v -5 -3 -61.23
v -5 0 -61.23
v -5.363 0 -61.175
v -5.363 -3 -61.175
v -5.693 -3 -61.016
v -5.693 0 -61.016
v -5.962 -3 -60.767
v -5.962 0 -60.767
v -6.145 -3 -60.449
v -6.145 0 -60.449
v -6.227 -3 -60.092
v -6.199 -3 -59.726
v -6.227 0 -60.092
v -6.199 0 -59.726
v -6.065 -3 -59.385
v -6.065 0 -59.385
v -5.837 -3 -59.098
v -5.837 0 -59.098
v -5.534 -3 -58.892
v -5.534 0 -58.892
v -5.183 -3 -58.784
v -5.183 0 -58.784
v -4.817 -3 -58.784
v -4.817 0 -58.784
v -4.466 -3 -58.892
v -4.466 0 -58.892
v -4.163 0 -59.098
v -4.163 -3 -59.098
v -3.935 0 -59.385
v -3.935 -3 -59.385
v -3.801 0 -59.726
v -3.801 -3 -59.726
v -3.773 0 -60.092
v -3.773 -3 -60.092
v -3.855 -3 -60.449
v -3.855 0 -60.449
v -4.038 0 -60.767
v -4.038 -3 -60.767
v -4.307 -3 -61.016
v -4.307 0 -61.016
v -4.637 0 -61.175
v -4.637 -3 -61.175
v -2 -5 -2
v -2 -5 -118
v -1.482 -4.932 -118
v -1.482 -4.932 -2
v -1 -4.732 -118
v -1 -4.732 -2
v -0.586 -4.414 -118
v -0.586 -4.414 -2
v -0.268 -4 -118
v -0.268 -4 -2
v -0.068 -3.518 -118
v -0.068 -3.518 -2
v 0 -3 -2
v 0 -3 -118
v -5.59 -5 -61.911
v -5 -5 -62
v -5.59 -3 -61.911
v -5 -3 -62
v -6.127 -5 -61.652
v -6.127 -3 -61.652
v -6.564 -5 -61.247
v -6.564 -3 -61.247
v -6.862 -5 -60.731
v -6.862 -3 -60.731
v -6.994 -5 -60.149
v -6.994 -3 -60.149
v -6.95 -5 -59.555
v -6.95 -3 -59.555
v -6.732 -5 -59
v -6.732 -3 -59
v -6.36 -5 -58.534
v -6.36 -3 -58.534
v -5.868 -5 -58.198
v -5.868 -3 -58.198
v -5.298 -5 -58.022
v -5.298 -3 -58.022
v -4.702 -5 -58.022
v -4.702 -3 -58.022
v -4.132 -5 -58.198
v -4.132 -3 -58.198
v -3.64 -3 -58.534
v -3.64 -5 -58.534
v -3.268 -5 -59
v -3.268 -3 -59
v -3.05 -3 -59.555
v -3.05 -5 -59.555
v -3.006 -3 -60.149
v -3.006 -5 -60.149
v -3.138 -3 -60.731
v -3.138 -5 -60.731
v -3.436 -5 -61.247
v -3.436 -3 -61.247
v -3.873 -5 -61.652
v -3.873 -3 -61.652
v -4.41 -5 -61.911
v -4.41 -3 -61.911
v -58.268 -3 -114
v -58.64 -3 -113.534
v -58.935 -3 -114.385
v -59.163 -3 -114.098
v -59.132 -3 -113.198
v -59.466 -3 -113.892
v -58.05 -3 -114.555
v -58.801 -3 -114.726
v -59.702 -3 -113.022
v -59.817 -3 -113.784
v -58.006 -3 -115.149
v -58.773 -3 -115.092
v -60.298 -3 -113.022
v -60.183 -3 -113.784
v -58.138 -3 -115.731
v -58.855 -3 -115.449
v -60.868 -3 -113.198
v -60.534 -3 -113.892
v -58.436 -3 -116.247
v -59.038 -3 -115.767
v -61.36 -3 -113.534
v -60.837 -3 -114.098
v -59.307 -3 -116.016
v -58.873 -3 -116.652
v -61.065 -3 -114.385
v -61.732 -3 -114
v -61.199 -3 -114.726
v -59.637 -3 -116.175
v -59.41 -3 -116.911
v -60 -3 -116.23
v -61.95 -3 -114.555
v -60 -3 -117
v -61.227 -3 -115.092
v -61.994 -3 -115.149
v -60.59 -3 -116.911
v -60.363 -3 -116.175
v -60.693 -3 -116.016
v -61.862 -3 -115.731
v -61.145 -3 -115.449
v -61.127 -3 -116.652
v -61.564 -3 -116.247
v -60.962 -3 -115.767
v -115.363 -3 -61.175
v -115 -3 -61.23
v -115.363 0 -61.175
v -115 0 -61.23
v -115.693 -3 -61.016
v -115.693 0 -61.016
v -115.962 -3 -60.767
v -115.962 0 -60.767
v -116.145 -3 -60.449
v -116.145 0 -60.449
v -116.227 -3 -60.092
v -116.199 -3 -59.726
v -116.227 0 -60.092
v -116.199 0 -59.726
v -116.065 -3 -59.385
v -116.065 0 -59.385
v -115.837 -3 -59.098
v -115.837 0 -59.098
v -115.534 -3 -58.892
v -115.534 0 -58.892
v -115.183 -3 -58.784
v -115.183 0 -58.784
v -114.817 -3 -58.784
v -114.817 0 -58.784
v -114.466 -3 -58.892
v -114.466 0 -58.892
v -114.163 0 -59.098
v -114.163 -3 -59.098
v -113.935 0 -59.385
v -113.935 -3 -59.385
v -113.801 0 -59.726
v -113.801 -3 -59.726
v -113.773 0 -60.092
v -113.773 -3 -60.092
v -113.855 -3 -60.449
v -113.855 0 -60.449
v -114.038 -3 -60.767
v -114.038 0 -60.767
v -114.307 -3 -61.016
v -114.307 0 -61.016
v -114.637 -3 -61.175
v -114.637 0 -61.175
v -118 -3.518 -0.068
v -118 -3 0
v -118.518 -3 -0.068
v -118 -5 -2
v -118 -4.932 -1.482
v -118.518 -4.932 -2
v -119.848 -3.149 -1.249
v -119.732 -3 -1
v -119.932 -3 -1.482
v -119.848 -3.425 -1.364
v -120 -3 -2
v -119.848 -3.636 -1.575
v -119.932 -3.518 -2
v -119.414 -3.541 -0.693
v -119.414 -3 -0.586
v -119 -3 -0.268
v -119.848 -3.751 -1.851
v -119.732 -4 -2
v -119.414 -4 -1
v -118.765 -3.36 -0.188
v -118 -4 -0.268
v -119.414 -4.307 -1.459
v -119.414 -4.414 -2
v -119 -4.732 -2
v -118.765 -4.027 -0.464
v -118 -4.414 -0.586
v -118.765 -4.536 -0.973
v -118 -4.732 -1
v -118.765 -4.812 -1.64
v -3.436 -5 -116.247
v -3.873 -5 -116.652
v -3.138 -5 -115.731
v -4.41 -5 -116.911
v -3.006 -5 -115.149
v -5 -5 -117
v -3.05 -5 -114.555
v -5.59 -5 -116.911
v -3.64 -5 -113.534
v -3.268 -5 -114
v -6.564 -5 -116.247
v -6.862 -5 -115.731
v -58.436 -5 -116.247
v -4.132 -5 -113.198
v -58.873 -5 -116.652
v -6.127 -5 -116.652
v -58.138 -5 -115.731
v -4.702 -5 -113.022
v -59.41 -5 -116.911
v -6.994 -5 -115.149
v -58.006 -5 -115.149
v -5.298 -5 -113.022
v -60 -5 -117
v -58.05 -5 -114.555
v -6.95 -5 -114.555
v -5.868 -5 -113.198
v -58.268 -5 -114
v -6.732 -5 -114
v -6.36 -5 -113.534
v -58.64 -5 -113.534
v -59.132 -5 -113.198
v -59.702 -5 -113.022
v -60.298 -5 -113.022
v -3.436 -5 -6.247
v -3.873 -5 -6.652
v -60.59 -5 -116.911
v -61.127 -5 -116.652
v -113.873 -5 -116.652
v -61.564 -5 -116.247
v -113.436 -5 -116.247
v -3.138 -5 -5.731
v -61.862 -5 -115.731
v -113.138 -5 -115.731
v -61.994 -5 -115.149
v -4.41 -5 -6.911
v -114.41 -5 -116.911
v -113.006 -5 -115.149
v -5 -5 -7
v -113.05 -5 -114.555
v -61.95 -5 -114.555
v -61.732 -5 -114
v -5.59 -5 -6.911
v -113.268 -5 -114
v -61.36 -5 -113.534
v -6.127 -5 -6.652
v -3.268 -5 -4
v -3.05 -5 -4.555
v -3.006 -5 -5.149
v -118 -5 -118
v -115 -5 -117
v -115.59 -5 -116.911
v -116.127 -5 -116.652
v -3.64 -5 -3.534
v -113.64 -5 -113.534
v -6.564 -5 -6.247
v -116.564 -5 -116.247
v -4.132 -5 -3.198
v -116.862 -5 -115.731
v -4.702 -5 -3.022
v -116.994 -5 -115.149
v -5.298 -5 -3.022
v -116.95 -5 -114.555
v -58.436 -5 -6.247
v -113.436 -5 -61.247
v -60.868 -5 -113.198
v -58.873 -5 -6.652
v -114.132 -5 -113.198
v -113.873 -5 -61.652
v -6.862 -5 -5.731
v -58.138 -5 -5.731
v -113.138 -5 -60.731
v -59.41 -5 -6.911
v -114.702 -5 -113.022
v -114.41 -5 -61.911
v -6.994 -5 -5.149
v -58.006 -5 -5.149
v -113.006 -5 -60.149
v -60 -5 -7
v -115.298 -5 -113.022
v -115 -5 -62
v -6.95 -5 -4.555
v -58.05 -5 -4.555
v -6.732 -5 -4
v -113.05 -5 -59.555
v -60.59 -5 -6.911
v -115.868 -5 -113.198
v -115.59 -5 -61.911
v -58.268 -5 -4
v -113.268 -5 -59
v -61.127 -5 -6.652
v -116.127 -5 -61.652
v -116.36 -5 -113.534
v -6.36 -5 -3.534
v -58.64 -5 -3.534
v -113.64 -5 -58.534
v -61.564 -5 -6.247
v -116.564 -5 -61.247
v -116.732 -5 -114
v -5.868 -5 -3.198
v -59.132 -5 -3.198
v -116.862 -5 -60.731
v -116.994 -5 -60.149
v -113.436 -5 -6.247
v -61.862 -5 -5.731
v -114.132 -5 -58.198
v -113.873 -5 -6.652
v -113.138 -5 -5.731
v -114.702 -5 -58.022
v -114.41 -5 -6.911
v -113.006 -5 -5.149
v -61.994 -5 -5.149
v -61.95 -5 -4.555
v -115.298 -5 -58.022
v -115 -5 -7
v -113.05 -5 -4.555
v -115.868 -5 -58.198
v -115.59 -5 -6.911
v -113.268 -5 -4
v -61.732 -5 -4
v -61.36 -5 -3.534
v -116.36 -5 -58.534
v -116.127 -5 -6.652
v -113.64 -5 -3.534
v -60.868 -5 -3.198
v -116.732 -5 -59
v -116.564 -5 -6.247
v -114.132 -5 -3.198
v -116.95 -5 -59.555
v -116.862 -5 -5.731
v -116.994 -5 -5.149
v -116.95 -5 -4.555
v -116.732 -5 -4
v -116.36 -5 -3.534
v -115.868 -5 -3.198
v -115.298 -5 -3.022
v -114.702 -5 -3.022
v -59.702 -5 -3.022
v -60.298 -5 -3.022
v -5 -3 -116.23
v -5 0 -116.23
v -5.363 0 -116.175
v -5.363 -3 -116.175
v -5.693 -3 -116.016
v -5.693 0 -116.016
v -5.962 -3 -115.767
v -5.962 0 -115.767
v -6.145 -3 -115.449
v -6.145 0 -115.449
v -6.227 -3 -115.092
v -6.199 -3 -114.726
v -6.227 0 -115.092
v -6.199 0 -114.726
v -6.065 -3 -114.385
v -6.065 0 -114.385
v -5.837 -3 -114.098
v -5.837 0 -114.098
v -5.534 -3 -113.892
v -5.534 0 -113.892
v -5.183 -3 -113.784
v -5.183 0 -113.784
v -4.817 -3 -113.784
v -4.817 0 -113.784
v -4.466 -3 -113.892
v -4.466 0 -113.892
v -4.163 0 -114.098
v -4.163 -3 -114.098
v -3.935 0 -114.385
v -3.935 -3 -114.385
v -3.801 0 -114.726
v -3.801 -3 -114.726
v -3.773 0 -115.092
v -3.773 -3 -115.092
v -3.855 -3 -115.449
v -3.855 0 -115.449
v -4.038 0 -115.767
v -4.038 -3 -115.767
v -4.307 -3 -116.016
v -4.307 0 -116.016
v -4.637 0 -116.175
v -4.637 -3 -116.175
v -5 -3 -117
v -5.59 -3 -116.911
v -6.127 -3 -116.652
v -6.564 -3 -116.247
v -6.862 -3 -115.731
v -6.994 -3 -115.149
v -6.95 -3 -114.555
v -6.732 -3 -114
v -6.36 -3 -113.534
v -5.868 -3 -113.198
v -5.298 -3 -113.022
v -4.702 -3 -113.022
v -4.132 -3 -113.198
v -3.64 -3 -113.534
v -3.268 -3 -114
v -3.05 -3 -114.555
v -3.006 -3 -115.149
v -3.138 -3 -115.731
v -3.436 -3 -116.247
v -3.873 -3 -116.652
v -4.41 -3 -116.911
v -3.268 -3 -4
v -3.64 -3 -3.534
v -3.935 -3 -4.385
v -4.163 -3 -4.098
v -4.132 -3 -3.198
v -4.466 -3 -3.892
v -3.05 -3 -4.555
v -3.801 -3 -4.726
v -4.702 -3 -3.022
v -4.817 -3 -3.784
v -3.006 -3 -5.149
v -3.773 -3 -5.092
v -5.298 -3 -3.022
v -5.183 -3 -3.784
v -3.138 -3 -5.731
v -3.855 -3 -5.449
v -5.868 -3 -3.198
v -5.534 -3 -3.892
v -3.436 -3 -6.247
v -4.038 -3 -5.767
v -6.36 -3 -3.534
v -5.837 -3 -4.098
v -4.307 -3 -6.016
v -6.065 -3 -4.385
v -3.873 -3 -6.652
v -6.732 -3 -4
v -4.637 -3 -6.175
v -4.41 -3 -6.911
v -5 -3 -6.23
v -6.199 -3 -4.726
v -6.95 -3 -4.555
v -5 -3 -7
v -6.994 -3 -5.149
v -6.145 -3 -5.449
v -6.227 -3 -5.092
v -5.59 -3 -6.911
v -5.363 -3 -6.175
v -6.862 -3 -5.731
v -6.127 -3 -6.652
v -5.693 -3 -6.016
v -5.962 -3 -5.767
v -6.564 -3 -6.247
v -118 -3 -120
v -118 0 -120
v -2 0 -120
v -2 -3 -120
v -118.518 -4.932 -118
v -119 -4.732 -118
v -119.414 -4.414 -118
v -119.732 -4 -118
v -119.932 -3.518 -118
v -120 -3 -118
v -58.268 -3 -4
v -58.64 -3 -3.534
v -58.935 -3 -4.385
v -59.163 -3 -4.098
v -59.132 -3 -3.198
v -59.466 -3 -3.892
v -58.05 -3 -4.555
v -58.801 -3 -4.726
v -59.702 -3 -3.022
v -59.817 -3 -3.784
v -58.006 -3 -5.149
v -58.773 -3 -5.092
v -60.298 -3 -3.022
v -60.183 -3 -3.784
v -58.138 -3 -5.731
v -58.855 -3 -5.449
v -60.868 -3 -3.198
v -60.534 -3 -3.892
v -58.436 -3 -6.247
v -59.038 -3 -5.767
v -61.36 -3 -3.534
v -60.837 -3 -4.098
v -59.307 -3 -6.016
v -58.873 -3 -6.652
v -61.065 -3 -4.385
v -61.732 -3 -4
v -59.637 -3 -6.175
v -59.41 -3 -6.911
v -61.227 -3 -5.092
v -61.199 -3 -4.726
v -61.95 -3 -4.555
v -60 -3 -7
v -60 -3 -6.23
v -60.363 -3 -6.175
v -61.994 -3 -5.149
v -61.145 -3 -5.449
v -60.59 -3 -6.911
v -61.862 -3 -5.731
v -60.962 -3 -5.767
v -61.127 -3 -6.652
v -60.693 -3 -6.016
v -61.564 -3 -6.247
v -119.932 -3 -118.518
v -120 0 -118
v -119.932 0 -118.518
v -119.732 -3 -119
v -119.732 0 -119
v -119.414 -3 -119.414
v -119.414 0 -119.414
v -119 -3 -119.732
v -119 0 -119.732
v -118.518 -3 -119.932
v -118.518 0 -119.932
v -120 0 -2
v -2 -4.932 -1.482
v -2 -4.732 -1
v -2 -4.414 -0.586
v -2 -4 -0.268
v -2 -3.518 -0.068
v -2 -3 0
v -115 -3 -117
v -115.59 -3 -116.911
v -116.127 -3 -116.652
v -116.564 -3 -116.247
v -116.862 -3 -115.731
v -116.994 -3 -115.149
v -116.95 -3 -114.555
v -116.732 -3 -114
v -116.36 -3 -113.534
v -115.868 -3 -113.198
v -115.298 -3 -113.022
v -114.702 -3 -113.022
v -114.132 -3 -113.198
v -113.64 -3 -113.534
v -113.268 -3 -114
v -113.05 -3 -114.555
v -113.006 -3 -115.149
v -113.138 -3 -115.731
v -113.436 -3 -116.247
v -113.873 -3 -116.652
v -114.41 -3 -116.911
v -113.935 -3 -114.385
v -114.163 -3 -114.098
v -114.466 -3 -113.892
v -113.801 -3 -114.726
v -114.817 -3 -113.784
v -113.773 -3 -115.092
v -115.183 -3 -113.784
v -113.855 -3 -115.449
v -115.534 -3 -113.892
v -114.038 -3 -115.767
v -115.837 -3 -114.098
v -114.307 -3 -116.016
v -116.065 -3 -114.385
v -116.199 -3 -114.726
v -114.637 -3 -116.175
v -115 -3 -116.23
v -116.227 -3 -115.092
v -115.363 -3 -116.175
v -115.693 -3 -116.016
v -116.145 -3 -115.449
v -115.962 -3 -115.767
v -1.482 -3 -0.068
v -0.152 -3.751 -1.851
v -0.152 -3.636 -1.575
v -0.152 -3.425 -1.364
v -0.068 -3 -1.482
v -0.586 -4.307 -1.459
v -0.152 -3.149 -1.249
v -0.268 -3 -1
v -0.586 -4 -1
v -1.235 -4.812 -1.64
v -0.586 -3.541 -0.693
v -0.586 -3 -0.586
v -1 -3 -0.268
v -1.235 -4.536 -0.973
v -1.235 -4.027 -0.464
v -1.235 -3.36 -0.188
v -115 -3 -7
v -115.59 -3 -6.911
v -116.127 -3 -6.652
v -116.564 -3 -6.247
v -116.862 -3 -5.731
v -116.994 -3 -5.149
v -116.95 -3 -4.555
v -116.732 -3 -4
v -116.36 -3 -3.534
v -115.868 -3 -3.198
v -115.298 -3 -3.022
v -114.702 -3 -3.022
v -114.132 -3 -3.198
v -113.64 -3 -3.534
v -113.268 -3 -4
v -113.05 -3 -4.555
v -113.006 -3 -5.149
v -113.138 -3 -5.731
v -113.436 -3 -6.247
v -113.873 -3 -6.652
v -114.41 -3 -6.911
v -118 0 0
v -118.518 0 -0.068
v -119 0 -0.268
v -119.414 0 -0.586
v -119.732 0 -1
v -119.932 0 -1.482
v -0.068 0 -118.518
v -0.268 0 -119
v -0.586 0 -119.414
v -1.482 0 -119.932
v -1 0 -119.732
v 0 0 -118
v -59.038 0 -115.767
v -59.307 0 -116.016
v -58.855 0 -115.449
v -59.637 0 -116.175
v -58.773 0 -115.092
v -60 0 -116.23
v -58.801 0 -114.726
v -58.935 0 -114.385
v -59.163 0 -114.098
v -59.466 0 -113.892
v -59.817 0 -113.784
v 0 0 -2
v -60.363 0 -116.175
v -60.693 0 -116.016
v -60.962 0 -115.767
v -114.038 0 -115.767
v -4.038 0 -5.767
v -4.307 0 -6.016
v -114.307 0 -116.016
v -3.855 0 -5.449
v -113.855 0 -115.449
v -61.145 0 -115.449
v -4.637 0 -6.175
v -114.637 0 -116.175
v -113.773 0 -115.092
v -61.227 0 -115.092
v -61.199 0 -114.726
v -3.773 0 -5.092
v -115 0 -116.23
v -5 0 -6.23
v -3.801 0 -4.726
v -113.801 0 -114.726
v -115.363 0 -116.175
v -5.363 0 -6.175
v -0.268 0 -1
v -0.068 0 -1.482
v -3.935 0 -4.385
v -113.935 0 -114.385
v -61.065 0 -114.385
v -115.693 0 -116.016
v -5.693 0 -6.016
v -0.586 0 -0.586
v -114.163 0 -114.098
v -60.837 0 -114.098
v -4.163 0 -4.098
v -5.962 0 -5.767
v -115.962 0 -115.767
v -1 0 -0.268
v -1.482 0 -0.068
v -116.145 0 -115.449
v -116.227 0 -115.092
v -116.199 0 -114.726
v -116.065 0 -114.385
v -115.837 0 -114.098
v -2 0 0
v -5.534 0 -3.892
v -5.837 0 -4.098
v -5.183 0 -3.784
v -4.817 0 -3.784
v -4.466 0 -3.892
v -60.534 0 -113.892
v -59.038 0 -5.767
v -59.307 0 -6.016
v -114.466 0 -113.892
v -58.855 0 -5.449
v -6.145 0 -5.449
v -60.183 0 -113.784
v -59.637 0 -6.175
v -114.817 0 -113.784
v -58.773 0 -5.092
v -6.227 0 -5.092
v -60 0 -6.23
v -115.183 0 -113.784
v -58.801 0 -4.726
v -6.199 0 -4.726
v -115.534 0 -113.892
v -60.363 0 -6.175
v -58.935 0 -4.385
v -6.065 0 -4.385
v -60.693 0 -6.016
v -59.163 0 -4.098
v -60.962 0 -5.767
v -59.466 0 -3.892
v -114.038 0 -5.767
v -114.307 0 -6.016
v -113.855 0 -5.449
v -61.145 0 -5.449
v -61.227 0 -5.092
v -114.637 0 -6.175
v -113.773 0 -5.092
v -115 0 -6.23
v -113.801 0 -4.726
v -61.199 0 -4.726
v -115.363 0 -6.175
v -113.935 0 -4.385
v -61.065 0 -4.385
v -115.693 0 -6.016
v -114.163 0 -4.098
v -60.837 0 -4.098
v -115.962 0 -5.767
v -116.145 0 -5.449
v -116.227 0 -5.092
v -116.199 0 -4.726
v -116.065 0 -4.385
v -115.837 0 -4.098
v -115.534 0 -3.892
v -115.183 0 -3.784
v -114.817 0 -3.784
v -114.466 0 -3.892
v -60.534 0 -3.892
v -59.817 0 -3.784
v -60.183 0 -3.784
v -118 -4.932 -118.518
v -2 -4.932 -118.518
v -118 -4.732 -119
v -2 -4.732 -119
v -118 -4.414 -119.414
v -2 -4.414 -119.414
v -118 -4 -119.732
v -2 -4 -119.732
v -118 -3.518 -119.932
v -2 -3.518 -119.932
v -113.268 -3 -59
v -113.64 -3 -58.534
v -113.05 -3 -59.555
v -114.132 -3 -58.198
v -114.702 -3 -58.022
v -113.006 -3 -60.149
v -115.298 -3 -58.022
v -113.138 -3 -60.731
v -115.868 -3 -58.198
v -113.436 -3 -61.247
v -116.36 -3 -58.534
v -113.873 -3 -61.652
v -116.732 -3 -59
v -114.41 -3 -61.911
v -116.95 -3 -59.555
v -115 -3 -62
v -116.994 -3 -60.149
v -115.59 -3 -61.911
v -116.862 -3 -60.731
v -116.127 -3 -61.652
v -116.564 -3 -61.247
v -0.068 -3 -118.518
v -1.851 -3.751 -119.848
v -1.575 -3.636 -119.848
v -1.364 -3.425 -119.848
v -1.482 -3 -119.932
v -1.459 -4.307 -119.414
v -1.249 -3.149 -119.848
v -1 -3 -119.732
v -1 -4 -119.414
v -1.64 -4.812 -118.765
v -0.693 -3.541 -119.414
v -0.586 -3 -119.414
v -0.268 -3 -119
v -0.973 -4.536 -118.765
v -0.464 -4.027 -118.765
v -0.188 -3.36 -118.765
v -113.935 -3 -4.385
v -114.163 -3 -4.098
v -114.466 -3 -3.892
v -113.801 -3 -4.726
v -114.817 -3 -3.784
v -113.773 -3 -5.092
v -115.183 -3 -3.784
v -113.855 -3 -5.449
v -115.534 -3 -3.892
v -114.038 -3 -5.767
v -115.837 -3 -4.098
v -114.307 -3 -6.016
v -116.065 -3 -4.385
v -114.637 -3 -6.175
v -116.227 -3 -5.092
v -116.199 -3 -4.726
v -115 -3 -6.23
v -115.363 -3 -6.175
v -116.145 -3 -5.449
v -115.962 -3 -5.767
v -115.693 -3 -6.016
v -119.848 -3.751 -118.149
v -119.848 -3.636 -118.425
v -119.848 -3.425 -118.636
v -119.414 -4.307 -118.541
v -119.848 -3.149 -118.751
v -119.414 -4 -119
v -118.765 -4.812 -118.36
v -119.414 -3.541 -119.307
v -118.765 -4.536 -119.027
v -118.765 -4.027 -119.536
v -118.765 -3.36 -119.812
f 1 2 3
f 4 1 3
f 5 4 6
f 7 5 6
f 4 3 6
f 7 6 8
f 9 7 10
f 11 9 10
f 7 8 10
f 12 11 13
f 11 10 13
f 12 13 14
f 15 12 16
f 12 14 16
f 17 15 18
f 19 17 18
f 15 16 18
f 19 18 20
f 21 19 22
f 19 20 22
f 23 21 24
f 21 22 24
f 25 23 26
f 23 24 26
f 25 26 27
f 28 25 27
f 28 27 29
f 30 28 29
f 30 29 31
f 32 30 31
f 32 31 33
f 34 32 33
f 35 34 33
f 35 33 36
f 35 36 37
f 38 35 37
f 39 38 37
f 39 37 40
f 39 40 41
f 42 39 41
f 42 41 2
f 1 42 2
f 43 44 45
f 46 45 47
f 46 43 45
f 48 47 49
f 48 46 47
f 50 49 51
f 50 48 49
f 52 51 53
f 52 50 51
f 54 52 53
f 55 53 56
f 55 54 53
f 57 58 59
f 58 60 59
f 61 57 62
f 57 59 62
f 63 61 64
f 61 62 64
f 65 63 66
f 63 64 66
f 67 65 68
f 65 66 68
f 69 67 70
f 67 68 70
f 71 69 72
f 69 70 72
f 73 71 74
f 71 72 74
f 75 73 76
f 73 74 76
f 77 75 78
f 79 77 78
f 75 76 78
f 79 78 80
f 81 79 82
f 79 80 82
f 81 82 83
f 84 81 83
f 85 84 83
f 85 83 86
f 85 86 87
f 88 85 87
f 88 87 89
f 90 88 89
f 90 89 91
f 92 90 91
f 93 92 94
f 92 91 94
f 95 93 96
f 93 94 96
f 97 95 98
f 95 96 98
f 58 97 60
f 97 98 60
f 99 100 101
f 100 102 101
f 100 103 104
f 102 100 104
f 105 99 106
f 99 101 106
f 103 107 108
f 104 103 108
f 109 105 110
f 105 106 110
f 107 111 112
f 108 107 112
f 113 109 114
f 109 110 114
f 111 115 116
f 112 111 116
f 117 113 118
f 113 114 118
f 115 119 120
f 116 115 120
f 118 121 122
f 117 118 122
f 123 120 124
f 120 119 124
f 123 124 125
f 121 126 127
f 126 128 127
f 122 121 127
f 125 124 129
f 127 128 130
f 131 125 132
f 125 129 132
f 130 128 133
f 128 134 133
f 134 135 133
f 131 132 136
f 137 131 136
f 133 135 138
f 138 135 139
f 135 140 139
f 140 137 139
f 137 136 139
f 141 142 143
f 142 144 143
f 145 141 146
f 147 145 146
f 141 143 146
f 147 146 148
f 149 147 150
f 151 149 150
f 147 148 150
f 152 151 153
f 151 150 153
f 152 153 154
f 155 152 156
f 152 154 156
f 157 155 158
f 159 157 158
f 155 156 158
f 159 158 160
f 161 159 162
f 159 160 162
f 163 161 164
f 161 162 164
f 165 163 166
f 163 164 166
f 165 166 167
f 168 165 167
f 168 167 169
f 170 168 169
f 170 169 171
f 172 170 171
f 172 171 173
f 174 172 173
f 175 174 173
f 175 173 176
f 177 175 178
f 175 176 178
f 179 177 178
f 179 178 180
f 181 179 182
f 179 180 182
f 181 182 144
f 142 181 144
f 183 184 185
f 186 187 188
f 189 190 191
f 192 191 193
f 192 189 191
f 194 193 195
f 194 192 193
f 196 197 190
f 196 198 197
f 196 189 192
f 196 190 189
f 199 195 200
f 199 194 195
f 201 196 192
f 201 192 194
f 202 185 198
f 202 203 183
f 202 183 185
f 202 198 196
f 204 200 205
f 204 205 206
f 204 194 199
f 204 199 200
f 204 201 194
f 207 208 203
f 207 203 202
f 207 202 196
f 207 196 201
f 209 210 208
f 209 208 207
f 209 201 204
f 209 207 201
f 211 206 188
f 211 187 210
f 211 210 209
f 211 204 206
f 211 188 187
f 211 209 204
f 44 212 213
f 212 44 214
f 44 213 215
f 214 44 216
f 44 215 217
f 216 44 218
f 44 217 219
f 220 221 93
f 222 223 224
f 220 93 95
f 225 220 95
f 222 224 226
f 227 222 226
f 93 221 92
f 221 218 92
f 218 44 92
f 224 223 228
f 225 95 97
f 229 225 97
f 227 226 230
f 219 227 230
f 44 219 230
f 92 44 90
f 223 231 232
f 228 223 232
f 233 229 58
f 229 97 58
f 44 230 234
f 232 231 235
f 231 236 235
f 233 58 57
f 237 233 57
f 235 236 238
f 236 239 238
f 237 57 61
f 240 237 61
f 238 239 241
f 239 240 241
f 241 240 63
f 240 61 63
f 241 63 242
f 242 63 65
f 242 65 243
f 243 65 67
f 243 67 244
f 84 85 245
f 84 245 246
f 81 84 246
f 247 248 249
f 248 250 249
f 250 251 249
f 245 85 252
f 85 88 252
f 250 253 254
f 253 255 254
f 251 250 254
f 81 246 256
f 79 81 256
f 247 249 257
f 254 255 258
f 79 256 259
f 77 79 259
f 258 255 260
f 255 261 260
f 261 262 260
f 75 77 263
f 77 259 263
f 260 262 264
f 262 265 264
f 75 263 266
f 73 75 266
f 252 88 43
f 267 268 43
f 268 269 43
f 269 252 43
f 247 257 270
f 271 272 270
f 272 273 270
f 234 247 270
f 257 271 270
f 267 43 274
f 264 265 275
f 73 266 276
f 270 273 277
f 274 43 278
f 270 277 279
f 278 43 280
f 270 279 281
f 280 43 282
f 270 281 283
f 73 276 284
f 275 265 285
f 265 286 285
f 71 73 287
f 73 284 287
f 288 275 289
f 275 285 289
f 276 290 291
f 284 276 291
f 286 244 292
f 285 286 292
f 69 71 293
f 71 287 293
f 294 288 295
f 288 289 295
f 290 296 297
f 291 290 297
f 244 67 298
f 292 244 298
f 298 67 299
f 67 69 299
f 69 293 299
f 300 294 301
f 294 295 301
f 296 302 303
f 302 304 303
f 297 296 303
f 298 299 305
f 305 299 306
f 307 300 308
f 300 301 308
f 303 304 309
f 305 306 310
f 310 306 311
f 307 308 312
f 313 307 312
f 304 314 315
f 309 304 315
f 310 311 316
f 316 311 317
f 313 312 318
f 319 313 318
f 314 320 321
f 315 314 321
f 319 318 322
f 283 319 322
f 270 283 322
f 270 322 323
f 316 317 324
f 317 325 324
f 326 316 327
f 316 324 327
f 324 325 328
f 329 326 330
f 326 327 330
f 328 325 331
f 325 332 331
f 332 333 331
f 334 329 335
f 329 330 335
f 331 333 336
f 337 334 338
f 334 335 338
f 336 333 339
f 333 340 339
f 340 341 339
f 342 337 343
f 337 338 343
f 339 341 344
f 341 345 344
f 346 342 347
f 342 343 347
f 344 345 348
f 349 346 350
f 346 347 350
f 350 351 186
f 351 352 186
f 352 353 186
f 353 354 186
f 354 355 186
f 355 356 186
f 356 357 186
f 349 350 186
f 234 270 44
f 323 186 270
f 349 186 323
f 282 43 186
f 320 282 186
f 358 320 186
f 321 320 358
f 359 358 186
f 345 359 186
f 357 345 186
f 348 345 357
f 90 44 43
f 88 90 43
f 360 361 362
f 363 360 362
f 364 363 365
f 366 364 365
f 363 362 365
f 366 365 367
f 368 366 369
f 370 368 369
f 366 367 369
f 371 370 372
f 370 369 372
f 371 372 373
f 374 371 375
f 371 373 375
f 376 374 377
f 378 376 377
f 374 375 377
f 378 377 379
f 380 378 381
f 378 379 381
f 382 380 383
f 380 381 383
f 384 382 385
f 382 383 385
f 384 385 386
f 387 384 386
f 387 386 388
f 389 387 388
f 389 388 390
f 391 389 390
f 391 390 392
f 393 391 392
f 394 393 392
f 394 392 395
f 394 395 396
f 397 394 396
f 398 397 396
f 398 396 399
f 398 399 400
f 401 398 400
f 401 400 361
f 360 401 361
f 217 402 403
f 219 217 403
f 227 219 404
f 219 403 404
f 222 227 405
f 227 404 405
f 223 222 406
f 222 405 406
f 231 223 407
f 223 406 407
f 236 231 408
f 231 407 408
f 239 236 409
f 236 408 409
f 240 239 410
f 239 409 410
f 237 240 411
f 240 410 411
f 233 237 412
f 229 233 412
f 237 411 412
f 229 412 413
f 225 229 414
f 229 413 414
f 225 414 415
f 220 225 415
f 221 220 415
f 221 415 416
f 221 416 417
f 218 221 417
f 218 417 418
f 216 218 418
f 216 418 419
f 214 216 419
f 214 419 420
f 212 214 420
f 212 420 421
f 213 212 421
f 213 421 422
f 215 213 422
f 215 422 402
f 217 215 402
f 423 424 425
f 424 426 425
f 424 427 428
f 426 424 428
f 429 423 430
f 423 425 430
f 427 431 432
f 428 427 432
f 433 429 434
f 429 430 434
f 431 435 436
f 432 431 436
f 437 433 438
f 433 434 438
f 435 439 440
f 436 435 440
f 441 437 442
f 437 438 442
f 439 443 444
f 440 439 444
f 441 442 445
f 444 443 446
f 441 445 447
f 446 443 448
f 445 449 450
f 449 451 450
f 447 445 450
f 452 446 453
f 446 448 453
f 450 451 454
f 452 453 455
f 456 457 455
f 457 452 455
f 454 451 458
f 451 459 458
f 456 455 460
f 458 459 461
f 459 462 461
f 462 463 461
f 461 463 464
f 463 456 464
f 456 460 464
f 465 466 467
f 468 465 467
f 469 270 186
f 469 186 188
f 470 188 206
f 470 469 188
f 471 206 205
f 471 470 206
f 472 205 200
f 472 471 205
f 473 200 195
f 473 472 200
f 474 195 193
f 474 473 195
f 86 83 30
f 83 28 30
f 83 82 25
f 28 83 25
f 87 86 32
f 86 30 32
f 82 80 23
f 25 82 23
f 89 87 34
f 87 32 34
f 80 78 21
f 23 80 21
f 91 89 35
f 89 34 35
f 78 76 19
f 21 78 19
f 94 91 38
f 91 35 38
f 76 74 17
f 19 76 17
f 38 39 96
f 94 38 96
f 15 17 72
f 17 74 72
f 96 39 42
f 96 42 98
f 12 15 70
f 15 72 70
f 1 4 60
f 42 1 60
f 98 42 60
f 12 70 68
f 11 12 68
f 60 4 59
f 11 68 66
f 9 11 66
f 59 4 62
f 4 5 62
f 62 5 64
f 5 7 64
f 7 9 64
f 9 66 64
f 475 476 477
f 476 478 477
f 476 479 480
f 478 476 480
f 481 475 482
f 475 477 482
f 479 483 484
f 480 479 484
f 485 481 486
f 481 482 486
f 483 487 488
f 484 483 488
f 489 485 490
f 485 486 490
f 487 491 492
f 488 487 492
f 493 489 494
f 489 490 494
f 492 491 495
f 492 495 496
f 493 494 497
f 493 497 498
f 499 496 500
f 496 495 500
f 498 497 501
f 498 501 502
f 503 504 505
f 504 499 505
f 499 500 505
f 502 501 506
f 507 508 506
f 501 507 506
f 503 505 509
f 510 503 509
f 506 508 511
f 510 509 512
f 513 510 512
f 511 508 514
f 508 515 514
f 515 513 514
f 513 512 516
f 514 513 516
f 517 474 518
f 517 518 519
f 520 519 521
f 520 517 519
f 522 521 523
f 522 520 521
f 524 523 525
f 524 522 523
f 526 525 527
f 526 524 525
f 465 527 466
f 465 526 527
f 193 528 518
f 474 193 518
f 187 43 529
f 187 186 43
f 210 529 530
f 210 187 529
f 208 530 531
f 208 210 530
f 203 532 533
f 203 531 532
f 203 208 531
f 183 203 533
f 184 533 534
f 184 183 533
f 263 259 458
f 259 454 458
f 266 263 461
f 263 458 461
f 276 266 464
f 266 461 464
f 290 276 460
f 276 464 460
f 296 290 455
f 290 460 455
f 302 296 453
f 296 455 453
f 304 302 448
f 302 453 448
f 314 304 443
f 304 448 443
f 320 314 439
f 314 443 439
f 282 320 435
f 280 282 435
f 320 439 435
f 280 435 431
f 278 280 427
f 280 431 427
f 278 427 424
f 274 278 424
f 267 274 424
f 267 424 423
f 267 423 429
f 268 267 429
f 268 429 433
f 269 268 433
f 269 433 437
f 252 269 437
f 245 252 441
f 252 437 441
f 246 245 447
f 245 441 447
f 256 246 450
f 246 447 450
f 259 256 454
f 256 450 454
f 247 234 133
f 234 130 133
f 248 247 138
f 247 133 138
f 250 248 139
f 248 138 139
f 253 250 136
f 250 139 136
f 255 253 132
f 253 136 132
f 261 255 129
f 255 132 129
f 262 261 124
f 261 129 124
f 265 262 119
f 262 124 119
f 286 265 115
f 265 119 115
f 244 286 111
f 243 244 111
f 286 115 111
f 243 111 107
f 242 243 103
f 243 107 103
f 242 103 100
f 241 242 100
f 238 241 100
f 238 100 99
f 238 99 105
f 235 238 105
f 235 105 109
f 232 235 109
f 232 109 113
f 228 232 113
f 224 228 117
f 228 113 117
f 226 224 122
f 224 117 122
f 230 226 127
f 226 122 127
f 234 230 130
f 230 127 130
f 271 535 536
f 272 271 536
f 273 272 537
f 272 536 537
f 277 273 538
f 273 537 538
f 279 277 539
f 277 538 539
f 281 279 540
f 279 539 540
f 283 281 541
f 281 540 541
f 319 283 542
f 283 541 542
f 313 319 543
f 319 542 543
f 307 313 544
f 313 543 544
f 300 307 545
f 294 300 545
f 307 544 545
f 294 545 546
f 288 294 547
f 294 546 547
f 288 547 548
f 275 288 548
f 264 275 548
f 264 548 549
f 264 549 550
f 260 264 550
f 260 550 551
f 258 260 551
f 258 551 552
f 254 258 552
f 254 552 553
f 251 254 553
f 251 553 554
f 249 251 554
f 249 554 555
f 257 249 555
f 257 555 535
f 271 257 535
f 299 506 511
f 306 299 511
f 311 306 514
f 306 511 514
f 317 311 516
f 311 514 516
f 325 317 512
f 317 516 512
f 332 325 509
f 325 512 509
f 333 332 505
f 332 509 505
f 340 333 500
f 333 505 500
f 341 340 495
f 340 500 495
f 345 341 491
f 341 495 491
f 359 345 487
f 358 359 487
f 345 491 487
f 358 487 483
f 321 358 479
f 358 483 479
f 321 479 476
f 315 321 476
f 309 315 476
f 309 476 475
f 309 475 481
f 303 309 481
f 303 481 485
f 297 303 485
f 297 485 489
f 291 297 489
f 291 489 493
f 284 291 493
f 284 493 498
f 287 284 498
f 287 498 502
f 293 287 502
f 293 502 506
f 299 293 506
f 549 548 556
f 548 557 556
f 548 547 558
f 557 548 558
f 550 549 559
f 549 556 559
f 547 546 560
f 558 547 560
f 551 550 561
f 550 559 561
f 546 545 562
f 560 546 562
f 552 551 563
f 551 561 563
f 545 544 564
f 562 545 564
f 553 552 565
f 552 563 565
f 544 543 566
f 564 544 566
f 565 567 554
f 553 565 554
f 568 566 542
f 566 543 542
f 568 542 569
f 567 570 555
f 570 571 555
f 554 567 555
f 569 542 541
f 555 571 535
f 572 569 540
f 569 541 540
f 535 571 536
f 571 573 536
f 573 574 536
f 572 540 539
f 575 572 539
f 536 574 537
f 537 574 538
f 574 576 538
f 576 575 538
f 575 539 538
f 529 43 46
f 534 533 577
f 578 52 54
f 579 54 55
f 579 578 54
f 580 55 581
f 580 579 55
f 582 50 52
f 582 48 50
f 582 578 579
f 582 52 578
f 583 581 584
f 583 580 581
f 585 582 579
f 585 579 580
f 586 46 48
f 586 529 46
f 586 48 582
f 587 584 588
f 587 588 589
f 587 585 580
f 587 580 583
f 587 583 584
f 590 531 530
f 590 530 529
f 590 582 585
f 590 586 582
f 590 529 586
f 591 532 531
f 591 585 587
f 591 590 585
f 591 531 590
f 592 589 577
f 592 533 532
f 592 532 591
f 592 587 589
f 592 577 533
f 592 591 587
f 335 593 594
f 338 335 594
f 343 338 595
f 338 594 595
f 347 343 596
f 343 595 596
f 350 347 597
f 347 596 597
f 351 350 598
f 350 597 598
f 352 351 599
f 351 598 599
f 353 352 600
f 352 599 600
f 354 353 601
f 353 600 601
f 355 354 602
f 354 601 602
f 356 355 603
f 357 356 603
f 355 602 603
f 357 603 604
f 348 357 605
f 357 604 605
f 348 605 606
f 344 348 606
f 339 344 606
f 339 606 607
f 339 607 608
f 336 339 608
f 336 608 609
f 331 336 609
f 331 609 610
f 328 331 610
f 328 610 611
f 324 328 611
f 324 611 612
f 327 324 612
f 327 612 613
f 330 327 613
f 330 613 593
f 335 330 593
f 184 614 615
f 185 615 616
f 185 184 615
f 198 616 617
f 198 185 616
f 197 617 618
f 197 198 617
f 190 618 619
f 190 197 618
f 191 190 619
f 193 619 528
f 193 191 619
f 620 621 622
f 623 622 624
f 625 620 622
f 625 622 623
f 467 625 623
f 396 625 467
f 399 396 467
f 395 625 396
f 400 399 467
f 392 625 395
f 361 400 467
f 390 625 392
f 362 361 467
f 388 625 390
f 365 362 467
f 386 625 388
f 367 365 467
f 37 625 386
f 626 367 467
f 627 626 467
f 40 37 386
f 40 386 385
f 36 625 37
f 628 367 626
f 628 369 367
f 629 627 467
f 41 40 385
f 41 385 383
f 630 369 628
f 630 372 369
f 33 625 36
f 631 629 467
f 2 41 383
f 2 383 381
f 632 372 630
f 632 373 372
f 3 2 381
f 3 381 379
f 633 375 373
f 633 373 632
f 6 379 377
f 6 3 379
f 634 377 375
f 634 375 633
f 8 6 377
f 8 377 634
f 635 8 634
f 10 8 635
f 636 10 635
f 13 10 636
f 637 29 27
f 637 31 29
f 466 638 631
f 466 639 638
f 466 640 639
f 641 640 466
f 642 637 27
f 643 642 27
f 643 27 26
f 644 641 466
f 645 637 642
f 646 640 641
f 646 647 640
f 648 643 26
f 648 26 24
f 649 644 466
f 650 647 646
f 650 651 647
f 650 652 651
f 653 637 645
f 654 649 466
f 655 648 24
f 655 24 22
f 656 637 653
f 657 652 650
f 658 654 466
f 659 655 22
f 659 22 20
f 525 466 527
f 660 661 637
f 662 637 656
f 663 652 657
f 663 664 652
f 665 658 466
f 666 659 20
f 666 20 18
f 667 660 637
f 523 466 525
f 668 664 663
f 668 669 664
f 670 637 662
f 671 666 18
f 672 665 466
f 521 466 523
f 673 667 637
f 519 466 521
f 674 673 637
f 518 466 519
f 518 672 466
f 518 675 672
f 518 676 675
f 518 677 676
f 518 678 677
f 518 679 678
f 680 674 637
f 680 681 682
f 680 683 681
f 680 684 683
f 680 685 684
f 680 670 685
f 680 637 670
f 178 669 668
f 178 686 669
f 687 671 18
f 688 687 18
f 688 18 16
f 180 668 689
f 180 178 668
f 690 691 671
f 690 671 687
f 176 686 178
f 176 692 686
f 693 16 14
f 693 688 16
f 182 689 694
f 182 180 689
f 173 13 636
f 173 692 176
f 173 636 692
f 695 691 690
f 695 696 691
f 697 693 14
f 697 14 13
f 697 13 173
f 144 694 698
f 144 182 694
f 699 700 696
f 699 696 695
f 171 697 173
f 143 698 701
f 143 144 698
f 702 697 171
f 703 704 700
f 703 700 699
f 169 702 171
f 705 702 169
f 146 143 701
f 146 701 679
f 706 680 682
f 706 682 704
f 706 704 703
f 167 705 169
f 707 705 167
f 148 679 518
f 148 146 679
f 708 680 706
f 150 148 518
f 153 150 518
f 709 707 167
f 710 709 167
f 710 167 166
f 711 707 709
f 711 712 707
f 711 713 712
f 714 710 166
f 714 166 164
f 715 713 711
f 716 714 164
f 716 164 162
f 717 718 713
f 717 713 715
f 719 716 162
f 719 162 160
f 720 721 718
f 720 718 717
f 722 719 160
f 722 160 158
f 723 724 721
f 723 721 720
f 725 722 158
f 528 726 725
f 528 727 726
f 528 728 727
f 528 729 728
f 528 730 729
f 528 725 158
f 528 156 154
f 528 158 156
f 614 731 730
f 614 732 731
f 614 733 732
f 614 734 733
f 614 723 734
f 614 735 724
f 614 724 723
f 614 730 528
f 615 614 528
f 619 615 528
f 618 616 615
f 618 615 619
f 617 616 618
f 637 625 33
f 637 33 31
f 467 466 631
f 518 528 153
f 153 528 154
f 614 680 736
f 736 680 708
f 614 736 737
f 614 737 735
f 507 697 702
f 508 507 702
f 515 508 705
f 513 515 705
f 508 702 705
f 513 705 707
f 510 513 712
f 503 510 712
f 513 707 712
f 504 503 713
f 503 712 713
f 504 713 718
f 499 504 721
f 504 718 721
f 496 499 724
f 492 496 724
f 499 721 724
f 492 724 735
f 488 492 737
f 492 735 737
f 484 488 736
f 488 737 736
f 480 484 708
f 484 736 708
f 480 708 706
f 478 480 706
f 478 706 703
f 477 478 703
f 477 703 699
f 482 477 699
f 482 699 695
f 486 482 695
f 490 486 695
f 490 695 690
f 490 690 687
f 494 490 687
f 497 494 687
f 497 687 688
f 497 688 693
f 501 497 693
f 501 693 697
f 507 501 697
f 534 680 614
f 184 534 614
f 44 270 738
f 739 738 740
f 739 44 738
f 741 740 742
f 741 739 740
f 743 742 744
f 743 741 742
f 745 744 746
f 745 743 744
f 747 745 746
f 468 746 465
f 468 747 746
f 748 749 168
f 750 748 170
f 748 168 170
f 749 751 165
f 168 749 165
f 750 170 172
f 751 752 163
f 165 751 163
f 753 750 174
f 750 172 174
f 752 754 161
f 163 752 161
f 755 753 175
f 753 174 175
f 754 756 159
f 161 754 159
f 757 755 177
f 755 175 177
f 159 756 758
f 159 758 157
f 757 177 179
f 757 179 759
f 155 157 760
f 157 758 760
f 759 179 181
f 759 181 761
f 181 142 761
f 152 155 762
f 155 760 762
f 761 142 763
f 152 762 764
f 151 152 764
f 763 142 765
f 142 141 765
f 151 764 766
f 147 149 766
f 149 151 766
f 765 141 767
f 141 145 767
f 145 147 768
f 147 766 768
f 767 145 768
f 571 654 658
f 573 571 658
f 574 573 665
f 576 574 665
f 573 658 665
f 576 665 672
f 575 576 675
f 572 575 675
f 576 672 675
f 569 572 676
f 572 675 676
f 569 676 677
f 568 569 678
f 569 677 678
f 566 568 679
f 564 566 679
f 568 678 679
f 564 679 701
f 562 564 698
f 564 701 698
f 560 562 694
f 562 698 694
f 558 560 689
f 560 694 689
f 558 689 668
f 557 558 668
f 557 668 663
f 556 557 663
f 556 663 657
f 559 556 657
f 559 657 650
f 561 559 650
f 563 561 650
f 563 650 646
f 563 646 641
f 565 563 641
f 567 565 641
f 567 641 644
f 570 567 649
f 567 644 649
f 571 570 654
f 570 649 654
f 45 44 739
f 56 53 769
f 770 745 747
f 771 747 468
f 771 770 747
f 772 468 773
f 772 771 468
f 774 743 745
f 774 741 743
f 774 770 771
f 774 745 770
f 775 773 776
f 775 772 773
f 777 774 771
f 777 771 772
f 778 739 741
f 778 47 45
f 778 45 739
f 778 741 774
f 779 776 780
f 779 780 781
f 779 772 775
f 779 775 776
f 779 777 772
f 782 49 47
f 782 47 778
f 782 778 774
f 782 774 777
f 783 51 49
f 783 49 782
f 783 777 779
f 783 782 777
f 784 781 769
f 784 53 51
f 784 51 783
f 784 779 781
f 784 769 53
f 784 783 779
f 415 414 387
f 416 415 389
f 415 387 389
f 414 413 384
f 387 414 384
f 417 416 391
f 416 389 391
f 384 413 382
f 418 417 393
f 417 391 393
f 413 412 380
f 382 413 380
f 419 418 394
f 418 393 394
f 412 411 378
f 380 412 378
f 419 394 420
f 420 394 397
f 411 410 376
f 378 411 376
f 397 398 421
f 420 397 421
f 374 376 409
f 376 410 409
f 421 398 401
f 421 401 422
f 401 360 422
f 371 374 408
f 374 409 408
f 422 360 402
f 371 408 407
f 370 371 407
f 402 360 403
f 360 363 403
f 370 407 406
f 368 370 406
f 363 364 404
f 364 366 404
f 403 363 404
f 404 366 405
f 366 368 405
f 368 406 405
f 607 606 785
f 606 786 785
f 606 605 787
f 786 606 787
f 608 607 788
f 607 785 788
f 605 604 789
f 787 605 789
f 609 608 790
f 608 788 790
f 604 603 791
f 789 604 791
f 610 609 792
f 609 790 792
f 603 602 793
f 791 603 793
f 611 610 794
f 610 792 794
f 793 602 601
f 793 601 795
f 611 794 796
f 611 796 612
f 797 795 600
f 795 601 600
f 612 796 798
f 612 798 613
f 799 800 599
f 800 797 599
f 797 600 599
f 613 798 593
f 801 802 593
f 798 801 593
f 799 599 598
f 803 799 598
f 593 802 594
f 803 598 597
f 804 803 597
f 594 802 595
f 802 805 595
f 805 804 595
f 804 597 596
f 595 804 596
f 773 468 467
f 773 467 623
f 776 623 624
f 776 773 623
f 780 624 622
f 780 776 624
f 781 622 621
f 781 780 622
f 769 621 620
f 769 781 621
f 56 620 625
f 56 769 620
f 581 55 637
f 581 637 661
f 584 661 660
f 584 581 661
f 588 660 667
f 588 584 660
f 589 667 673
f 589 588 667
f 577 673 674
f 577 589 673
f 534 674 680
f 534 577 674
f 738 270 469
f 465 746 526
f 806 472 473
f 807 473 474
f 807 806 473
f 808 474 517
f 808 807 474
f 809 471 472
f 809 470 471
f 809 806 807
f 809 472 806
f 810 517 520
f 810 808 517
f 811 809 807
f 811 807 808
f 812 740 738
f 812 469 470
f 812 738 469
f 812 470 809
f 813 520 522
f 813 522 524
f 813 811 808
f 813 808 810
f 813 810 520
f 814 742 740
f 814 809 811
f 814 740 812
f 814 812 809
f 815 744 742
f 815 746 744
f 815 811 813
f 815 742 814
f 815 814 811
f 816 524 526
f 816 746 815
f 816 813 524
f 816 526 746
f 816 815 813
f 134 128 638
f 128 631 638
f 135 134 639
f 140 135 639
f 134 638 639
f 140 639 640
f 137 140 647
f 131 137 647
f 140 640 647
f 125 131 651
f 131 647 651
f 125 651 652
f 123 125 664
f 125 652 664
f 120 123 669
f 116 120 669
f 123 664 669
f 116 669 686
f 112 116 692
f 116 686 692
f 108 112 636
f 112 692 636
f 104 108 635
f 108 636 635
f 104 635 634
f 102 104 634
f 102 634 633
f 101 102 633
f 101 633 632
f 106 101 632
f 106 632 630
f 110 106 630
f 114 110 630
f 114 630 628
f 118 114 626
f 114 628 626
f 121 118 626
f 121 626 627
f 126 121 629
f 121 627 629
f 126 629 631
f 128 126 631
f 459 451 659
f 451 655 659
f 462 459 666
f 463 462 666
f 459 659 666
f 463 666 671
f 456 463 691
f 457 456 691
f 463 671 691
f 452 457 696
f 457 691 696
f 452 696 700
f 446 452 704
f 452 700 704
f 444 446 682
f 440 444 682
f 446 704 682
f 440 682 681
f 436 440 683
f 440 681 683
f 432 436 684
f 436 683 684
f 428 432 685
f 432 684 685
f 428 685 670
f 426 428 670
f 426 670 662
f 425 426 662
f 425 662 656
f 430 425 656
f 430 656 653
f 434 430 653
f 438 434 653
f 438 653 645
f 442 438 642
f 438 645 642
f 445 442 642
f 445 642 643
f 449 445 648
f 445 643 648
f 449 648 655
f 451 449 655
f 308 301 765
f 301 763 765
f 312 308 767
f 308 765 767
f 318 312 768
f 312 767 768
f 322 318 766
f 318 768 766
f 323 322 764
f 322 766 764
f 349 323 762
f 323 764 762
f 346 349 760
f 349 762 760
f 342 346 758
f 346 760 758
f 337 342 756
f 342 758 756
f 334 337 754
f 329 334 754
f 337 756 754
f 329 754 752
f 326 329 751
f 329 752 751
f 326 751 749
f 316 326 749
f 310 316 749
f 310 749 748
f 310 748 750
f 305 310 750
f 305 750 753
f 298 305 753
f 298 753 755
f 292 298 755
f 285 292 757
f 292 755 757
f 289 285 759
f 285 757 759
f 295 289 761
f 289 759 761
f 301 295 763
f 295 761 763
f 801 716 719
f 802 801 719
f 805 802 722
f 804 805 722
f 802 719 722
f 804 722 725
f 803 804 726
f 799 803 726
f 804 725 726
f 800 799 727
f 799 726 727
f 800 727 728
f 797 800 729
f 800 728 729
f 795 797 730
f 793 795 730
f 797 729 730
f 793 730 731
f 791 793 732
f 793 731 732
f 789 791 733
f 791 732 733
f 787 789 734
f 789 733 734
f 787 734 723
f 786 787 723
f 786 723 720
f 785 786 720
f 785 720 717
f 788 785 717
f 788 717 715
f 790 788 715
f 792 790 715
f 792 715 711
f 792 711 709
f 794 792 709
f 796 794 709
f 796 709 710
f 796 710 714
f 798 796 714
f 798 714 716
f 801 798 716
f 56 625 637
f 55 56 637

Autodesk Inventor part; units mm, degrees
ref_plane "YZ Ebene" through (0, 0, 0) normal (1, 0, 0) x (0, 1, 0)
ref_plane "XZ Ebene" through (0, 0, 0) normal (0, 1, 0) x (-1, 0, 0)
ref_plane "XY Ebene" through (0, 0, 0) normal (0, 0, 1) x (1, 0, 0)
sketch "Sketch20" plane through (0, 0, 0) normal (0, 1, 0) x (-1, 0, 0)
  line L0 (0, 0) -> (120, 0)
  line L1 (120, 0) -> (120, -120)
  line L2 (120, -120) -> (0, -120)
  line L3 (0, -120) -> (0, 0)
  dimension "d58" = 120
  dimension "d59" = 120
extrude "Extrusion8" add sketch "Sketch20" against normal blind 5
fillet "Fillet5" radius 2 8 edges at (-60, -5, 0) (0, -2.5, 0) (0, -5, -60) (0, -2.5, -120) (-60, -5, -120) (-120, -5, -60) (-120, -2.5, -120) (-120, -2.5, 0)
sketch "Sketch21" plane through (0, -5, 0) normal (0, -1, 0) x (1, 0, 0)
  line L0 (-2, 0) -> (-118, 0) projected
  line L1 (0, -118) -> (0, -2) projected
  line L2 (-120, -2) -> (-120, -118) projected
  line L3 (-118, -120) -> (-2, -120) projected
  point P0 (0, 0)
  point P1 (-5, -5)
  point P2 (-60, -5)
  point P3 (-115, -5)
  point P4 (-115, -5)
  point P5 (-115, -115)
  point P6 (-5, -115)
  point P7 (-5, -60)
  point P8 (-115, -60)
  point P9 (-60, -115)
  dimension "d63" = 5
  dimension "d64" = 5
  dimension "d65" = 55
  dimension "d66" = 5
  dimension "d67" = 5
  dimension "d68" = 55
  dimension "d69" = 5
  dimension "d70" = 5
  dimension "d71" = 55
hole "Hole2" at (-5, -5, -5) at (-60, -5, -5) at (-115, -5, -5) at (-115, -5, -115) at (-5, -5, -115) at (-5, -5, -60) at (-115, -5, -60) at (-60, -5, -115) direction (0, 1, 0) diameter 2.46 depth 8.8 counterbore diameter 4 counterbore depth 2 thread size "M3x0.5" class "6H" standard "ISO Metric profile"
properties part number "raspberry_box_lid" material "S235JR"
